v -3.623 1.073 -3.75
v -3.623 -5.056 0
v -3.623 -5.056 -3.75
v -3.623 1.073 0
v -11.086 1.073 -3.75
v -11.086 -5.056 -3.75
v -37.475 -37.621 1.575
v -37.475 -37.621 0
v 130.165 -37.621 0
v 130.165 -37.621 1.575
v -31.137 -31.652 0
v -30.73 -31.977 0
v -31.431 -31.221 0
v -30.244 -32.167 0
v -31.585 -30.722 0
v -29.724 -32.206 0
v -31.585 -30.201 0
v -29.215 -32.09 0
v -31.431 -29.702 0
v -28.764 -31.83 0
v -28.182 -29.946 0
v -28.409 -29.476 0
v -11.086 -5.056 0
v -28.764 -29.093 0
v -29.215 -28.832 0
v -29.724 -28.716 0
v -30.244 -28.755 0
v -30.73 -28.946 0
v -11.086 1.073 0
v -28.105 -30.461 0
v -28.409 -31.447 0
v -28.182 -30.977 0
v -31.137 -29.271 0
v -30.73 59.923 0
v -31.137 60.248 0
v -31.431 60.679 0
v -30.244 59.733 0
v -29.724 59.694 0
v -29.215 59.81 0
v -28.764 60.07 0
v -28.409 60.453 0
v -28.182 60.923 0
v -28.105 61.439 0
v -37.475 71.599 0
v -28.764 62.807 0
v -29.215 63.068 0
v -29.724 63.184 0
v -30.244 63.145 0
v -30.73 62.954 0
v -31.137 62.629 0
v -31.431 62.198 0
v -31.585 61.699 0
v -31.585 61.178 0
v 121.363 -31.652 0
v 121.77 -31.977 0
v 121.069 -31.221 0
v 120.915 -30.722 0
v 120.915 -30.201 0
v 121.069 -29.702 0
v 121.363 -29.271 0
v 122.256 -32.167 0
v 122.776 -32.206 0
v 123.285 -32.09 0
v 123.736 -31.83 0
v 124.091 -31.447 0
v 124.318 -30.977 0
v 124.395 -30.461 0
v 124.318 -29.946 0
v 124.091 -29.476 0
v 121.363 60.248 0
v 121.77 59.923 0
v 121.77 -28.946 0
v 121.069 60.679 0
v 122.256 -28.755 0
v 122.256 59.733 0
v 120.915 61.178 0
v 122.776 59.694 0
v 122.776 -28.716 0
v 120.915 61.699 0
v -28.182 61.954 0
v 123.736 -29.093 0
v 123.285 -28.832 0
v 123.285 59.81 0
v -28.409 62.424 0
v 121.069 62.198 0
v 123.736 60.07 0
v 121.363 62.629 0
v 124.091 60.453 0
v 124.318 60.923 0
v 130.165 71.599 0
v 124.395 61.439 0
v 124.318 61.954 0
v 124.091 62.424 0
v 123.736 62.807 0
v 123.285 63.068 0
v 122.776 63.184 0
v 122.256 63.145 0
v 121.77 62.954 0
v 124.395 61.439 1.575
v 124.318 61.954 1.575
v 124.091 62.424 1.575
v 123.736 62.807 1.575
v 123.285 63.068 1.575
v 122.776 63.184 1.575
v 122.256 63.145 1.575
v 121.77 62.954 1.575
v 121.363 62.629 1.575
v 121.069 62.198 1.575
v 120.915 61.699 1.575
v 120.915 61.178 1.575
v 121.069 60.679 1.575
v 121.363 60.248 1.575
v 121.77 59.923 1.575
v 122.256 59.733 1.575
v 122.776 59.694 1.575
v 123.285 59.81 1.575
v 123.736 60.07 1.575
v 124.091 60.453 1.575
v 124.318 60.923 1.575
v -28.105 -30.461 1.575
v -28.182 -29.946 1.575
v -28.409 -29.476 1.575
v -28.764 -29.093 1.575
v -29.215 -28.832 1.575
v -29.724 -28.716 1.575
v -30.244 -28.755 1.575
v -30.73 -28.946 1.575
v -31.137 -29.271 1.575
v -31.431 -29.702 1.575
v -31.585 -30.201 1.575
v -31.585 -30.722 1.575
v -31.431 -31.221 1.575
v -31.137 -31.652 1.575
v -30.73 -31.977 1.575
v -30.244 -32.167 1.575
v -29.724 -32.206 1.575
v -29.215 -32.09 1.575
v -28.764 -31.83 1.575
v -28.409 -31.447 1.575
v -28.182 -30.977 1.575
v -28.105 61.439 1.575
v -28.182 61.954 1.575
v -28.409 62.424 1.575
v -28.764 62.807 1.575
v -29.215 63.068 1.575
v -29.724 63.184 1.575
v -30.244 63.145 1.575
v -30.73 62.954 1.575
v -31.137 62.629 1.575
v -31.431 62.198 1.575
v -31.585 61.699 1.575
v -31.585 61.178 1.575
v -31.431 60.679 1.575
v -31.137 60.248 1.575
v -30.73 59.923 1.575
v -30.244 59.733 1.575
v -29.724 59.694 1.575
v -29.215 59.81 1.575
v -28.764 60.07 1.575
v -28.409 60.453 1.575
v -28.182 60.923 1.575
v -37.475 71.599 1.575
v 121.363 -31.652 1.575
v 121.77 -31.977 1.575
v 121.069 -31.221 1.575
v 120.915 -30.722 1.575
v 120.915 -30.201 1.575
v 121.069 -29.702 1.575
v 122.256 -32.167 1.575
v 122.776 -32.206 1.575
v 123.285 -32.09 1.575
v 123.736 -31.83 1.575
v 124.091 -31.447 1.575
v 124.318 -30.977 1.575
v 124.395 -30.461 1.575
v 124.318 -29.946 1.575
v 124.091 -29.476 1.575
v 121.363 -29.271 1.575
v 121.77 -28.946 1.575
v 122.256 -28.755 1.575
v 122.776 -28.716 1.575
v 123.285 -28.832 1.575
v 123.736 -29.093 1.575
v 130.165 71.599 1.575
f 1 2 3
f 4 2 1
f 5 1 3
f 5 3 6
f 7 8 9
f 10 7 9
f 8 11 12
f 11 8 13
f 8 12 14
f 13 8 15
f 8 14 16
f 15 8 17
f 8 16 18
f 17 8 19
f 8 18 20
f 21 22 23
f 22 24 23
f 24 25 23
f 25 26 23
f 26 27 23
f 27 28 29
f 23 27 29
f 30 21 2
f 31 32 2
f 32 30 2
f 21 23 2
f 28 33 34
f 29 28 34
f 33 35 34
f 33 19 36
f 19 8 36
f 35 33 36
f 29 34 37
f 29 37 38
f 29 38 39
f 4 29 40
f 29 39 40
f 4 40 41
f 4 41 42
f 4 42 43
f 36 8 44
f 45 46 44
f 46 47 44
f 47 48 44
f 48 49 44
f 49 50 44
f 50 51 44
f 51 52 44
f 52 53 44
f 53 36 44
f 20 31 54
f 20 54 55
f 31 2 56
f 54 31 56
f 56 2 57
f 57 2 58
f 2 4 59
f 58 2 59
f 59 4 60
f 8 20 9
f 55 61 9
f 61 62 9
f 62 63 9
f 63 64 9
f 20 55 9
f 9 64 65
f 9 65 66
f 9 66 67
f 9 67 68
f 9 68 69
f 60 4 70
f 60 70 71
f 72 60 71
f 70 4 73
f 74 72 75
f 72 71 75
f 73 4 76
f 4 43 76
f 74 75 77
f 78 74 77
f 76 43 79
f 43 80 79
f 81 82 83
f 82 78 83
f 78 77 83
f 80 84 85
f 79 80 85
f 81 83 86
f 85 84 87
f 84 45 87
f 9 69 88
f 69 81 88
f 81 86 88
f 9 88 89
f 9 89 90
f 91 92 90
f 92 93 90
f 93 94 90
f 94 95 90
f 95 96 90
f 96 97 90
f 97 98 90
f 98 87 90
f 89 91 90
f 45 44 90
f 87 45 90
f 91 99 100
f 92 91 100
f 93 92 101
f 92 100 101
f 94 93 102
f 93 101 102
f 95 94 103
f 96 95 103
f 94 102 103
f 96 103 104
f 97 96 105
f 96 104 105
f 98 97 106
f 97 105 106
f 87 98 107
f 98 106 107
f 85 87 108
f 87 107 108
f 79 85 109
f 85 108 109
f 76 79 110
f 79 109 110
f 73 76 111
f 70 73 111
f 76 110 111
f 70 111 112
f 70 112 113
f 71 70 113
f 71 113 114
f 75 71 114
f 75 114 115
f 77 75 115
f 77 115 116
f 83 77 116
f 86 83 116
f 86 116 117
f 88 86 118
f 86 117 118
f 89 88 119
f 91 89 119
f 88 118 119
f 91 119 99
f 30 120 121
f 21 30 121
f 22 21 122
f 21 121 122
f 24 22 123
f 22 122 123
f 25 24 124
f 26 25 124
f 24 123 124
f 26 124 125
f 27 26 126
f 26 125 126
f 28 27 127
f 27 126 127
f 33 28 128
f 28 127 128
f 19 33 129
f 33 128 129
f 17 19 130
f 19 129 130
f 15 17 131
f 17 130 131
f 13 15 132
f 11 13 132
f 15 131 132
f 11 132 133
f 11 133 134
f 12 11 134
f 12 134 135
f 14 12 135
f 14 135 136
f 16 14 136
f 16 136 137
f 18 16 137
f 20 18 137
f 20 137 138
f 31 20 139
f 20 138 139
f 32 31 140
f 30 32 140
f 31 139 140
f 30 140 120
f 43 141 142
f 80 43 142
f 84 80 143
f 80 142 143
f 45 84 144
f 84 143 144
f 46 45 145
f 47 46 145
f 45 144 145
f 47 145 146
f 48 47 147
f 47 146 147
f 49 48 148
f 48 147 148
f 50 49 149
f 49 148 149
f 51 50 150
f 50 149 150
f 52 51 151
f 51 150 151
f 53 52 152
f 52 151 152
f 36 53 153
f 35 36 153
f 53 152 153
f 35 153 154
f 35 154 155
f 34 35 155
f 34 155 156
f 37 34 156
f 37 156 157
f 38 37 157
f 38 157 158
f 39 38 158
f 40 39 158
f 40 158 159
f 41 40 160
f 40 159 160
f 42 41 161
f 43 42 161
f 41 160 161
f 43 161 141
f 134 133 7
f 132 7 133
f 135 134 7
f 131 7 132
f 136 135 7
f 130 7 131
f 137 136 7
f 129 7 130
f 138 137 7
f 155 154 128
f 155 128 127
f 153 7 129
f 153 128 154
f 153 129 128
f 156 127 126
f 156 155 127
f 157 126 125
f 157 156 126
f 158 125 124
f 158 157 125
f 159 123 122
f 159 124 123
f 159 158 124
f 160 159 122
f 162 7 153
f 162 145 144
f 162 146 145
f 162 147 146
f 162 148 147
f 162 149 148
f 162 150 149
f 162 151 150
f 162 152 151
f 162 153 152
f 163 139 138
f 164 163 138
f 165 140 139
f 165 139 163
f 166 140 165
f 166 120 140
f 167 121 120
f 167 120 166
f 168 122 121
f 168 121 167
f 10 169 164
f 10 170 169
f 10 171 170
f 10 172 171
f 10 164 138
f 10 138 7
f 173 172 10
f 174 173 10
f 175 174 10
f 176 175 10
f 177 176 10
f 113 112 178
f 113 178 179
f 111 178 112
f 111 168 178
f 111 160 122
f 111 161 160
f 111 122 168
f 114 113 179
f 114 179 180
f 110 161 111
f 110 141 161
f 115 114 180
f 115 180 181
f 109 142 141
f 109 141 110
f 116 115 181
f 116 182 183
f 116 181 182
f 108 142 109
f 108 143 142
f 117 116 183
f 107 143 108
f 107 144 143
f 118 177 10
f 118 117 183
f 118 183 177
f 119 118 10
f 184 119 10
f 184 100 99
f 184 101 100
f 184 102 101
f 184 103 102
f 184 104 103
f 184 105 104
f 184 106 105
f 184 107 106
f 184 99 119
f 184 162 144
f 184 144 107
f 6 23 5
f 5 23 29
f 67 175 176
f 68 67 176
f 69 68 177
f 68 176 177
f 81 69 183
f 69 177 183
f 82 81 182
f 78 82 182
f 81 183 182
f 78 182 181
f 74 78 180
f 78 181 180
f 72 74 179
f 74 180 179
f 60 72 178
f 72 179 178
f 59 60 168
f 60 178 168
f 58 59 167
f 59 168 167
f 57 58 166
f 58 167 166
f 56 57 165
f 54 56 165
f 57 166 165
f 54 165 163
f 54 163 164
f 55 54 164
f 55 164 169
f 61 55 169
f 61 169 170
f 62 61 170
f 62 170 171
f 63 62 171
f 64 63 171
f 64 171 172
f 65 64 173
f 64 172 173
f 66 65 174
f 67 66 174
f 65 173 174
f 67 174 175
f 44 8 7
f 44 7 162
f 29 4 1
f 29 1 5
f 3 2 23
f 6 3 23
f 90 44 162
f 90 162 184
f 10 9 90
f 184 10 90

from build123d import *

# Parameters (mm, degrees)
SKETCH1_W            = 167.64
SKETCH1_H            = 109.22
PCB_DEPTH            = 1.5748
SKETCH2_R            = 1.75
MOUNT_HOLE_CUT_DEPTH = 1.5748
LPATTERN1_COUNT      = 2
LPATTERN1_PITCH      = 152.5
LPATTERN1_COUNT_DIR2 = 2
LPATTERN1_PITCH_DIR2 = 91.9
SKETCH3_W            = 7.463209877
SKETCH3_H            = 6.129068463
EXTRUDE1_DEPTH       = 3.75


with BuildPart() as part:
    # Sketch1 → PCB (new body)
    with BuildSketch(Plane.XY):
        with Locations((46.345343175, 16.988671329)):
            Rectangle(SKETCH1_W, SKETCH1_H)
    extrude(amount=PCB_DEPTH)

    # Sketch2 → mount hole cut (cut)
    with BuildSketch(Plane.XY.offset(1.5748)):
        with Locations((-29.854656825, 61.438671329)):
            Circle(SKETCH2_R)
    mount_hole_cut = extrude(amount=-MOUNT_HOLE_CUT_DEPTH, mode=Mode.SUBTRACT)

    # LPattern1: mount hole cut 2 × 2
    with Locations(*[(i * LPATTERN1_PITCH, -j * LPATTERN1_PITCH_DIR2, 0) for i in range(LPATTERN1_COUNT) for j in range(LPATTERN1_COUNT_DIR2) if (i, j) != (0, 0)]):
        add(mount_hole_cut, mode=Mode.SUBTRACT)

    # Sketch3 → Extrude1 (add)
    with BuildSketch(Plane(origin=(0, 0, 0), x_dir=(-1, 0, 0), z_dir=(0, 0, -1))):
        with Locations((7.354656825, -1.991328672)):
            Rectangle(SKETCH3_W, SKETCH3_H)
    extrude(amount=EXTRUDE1_DEPTH)


solid = part.part
